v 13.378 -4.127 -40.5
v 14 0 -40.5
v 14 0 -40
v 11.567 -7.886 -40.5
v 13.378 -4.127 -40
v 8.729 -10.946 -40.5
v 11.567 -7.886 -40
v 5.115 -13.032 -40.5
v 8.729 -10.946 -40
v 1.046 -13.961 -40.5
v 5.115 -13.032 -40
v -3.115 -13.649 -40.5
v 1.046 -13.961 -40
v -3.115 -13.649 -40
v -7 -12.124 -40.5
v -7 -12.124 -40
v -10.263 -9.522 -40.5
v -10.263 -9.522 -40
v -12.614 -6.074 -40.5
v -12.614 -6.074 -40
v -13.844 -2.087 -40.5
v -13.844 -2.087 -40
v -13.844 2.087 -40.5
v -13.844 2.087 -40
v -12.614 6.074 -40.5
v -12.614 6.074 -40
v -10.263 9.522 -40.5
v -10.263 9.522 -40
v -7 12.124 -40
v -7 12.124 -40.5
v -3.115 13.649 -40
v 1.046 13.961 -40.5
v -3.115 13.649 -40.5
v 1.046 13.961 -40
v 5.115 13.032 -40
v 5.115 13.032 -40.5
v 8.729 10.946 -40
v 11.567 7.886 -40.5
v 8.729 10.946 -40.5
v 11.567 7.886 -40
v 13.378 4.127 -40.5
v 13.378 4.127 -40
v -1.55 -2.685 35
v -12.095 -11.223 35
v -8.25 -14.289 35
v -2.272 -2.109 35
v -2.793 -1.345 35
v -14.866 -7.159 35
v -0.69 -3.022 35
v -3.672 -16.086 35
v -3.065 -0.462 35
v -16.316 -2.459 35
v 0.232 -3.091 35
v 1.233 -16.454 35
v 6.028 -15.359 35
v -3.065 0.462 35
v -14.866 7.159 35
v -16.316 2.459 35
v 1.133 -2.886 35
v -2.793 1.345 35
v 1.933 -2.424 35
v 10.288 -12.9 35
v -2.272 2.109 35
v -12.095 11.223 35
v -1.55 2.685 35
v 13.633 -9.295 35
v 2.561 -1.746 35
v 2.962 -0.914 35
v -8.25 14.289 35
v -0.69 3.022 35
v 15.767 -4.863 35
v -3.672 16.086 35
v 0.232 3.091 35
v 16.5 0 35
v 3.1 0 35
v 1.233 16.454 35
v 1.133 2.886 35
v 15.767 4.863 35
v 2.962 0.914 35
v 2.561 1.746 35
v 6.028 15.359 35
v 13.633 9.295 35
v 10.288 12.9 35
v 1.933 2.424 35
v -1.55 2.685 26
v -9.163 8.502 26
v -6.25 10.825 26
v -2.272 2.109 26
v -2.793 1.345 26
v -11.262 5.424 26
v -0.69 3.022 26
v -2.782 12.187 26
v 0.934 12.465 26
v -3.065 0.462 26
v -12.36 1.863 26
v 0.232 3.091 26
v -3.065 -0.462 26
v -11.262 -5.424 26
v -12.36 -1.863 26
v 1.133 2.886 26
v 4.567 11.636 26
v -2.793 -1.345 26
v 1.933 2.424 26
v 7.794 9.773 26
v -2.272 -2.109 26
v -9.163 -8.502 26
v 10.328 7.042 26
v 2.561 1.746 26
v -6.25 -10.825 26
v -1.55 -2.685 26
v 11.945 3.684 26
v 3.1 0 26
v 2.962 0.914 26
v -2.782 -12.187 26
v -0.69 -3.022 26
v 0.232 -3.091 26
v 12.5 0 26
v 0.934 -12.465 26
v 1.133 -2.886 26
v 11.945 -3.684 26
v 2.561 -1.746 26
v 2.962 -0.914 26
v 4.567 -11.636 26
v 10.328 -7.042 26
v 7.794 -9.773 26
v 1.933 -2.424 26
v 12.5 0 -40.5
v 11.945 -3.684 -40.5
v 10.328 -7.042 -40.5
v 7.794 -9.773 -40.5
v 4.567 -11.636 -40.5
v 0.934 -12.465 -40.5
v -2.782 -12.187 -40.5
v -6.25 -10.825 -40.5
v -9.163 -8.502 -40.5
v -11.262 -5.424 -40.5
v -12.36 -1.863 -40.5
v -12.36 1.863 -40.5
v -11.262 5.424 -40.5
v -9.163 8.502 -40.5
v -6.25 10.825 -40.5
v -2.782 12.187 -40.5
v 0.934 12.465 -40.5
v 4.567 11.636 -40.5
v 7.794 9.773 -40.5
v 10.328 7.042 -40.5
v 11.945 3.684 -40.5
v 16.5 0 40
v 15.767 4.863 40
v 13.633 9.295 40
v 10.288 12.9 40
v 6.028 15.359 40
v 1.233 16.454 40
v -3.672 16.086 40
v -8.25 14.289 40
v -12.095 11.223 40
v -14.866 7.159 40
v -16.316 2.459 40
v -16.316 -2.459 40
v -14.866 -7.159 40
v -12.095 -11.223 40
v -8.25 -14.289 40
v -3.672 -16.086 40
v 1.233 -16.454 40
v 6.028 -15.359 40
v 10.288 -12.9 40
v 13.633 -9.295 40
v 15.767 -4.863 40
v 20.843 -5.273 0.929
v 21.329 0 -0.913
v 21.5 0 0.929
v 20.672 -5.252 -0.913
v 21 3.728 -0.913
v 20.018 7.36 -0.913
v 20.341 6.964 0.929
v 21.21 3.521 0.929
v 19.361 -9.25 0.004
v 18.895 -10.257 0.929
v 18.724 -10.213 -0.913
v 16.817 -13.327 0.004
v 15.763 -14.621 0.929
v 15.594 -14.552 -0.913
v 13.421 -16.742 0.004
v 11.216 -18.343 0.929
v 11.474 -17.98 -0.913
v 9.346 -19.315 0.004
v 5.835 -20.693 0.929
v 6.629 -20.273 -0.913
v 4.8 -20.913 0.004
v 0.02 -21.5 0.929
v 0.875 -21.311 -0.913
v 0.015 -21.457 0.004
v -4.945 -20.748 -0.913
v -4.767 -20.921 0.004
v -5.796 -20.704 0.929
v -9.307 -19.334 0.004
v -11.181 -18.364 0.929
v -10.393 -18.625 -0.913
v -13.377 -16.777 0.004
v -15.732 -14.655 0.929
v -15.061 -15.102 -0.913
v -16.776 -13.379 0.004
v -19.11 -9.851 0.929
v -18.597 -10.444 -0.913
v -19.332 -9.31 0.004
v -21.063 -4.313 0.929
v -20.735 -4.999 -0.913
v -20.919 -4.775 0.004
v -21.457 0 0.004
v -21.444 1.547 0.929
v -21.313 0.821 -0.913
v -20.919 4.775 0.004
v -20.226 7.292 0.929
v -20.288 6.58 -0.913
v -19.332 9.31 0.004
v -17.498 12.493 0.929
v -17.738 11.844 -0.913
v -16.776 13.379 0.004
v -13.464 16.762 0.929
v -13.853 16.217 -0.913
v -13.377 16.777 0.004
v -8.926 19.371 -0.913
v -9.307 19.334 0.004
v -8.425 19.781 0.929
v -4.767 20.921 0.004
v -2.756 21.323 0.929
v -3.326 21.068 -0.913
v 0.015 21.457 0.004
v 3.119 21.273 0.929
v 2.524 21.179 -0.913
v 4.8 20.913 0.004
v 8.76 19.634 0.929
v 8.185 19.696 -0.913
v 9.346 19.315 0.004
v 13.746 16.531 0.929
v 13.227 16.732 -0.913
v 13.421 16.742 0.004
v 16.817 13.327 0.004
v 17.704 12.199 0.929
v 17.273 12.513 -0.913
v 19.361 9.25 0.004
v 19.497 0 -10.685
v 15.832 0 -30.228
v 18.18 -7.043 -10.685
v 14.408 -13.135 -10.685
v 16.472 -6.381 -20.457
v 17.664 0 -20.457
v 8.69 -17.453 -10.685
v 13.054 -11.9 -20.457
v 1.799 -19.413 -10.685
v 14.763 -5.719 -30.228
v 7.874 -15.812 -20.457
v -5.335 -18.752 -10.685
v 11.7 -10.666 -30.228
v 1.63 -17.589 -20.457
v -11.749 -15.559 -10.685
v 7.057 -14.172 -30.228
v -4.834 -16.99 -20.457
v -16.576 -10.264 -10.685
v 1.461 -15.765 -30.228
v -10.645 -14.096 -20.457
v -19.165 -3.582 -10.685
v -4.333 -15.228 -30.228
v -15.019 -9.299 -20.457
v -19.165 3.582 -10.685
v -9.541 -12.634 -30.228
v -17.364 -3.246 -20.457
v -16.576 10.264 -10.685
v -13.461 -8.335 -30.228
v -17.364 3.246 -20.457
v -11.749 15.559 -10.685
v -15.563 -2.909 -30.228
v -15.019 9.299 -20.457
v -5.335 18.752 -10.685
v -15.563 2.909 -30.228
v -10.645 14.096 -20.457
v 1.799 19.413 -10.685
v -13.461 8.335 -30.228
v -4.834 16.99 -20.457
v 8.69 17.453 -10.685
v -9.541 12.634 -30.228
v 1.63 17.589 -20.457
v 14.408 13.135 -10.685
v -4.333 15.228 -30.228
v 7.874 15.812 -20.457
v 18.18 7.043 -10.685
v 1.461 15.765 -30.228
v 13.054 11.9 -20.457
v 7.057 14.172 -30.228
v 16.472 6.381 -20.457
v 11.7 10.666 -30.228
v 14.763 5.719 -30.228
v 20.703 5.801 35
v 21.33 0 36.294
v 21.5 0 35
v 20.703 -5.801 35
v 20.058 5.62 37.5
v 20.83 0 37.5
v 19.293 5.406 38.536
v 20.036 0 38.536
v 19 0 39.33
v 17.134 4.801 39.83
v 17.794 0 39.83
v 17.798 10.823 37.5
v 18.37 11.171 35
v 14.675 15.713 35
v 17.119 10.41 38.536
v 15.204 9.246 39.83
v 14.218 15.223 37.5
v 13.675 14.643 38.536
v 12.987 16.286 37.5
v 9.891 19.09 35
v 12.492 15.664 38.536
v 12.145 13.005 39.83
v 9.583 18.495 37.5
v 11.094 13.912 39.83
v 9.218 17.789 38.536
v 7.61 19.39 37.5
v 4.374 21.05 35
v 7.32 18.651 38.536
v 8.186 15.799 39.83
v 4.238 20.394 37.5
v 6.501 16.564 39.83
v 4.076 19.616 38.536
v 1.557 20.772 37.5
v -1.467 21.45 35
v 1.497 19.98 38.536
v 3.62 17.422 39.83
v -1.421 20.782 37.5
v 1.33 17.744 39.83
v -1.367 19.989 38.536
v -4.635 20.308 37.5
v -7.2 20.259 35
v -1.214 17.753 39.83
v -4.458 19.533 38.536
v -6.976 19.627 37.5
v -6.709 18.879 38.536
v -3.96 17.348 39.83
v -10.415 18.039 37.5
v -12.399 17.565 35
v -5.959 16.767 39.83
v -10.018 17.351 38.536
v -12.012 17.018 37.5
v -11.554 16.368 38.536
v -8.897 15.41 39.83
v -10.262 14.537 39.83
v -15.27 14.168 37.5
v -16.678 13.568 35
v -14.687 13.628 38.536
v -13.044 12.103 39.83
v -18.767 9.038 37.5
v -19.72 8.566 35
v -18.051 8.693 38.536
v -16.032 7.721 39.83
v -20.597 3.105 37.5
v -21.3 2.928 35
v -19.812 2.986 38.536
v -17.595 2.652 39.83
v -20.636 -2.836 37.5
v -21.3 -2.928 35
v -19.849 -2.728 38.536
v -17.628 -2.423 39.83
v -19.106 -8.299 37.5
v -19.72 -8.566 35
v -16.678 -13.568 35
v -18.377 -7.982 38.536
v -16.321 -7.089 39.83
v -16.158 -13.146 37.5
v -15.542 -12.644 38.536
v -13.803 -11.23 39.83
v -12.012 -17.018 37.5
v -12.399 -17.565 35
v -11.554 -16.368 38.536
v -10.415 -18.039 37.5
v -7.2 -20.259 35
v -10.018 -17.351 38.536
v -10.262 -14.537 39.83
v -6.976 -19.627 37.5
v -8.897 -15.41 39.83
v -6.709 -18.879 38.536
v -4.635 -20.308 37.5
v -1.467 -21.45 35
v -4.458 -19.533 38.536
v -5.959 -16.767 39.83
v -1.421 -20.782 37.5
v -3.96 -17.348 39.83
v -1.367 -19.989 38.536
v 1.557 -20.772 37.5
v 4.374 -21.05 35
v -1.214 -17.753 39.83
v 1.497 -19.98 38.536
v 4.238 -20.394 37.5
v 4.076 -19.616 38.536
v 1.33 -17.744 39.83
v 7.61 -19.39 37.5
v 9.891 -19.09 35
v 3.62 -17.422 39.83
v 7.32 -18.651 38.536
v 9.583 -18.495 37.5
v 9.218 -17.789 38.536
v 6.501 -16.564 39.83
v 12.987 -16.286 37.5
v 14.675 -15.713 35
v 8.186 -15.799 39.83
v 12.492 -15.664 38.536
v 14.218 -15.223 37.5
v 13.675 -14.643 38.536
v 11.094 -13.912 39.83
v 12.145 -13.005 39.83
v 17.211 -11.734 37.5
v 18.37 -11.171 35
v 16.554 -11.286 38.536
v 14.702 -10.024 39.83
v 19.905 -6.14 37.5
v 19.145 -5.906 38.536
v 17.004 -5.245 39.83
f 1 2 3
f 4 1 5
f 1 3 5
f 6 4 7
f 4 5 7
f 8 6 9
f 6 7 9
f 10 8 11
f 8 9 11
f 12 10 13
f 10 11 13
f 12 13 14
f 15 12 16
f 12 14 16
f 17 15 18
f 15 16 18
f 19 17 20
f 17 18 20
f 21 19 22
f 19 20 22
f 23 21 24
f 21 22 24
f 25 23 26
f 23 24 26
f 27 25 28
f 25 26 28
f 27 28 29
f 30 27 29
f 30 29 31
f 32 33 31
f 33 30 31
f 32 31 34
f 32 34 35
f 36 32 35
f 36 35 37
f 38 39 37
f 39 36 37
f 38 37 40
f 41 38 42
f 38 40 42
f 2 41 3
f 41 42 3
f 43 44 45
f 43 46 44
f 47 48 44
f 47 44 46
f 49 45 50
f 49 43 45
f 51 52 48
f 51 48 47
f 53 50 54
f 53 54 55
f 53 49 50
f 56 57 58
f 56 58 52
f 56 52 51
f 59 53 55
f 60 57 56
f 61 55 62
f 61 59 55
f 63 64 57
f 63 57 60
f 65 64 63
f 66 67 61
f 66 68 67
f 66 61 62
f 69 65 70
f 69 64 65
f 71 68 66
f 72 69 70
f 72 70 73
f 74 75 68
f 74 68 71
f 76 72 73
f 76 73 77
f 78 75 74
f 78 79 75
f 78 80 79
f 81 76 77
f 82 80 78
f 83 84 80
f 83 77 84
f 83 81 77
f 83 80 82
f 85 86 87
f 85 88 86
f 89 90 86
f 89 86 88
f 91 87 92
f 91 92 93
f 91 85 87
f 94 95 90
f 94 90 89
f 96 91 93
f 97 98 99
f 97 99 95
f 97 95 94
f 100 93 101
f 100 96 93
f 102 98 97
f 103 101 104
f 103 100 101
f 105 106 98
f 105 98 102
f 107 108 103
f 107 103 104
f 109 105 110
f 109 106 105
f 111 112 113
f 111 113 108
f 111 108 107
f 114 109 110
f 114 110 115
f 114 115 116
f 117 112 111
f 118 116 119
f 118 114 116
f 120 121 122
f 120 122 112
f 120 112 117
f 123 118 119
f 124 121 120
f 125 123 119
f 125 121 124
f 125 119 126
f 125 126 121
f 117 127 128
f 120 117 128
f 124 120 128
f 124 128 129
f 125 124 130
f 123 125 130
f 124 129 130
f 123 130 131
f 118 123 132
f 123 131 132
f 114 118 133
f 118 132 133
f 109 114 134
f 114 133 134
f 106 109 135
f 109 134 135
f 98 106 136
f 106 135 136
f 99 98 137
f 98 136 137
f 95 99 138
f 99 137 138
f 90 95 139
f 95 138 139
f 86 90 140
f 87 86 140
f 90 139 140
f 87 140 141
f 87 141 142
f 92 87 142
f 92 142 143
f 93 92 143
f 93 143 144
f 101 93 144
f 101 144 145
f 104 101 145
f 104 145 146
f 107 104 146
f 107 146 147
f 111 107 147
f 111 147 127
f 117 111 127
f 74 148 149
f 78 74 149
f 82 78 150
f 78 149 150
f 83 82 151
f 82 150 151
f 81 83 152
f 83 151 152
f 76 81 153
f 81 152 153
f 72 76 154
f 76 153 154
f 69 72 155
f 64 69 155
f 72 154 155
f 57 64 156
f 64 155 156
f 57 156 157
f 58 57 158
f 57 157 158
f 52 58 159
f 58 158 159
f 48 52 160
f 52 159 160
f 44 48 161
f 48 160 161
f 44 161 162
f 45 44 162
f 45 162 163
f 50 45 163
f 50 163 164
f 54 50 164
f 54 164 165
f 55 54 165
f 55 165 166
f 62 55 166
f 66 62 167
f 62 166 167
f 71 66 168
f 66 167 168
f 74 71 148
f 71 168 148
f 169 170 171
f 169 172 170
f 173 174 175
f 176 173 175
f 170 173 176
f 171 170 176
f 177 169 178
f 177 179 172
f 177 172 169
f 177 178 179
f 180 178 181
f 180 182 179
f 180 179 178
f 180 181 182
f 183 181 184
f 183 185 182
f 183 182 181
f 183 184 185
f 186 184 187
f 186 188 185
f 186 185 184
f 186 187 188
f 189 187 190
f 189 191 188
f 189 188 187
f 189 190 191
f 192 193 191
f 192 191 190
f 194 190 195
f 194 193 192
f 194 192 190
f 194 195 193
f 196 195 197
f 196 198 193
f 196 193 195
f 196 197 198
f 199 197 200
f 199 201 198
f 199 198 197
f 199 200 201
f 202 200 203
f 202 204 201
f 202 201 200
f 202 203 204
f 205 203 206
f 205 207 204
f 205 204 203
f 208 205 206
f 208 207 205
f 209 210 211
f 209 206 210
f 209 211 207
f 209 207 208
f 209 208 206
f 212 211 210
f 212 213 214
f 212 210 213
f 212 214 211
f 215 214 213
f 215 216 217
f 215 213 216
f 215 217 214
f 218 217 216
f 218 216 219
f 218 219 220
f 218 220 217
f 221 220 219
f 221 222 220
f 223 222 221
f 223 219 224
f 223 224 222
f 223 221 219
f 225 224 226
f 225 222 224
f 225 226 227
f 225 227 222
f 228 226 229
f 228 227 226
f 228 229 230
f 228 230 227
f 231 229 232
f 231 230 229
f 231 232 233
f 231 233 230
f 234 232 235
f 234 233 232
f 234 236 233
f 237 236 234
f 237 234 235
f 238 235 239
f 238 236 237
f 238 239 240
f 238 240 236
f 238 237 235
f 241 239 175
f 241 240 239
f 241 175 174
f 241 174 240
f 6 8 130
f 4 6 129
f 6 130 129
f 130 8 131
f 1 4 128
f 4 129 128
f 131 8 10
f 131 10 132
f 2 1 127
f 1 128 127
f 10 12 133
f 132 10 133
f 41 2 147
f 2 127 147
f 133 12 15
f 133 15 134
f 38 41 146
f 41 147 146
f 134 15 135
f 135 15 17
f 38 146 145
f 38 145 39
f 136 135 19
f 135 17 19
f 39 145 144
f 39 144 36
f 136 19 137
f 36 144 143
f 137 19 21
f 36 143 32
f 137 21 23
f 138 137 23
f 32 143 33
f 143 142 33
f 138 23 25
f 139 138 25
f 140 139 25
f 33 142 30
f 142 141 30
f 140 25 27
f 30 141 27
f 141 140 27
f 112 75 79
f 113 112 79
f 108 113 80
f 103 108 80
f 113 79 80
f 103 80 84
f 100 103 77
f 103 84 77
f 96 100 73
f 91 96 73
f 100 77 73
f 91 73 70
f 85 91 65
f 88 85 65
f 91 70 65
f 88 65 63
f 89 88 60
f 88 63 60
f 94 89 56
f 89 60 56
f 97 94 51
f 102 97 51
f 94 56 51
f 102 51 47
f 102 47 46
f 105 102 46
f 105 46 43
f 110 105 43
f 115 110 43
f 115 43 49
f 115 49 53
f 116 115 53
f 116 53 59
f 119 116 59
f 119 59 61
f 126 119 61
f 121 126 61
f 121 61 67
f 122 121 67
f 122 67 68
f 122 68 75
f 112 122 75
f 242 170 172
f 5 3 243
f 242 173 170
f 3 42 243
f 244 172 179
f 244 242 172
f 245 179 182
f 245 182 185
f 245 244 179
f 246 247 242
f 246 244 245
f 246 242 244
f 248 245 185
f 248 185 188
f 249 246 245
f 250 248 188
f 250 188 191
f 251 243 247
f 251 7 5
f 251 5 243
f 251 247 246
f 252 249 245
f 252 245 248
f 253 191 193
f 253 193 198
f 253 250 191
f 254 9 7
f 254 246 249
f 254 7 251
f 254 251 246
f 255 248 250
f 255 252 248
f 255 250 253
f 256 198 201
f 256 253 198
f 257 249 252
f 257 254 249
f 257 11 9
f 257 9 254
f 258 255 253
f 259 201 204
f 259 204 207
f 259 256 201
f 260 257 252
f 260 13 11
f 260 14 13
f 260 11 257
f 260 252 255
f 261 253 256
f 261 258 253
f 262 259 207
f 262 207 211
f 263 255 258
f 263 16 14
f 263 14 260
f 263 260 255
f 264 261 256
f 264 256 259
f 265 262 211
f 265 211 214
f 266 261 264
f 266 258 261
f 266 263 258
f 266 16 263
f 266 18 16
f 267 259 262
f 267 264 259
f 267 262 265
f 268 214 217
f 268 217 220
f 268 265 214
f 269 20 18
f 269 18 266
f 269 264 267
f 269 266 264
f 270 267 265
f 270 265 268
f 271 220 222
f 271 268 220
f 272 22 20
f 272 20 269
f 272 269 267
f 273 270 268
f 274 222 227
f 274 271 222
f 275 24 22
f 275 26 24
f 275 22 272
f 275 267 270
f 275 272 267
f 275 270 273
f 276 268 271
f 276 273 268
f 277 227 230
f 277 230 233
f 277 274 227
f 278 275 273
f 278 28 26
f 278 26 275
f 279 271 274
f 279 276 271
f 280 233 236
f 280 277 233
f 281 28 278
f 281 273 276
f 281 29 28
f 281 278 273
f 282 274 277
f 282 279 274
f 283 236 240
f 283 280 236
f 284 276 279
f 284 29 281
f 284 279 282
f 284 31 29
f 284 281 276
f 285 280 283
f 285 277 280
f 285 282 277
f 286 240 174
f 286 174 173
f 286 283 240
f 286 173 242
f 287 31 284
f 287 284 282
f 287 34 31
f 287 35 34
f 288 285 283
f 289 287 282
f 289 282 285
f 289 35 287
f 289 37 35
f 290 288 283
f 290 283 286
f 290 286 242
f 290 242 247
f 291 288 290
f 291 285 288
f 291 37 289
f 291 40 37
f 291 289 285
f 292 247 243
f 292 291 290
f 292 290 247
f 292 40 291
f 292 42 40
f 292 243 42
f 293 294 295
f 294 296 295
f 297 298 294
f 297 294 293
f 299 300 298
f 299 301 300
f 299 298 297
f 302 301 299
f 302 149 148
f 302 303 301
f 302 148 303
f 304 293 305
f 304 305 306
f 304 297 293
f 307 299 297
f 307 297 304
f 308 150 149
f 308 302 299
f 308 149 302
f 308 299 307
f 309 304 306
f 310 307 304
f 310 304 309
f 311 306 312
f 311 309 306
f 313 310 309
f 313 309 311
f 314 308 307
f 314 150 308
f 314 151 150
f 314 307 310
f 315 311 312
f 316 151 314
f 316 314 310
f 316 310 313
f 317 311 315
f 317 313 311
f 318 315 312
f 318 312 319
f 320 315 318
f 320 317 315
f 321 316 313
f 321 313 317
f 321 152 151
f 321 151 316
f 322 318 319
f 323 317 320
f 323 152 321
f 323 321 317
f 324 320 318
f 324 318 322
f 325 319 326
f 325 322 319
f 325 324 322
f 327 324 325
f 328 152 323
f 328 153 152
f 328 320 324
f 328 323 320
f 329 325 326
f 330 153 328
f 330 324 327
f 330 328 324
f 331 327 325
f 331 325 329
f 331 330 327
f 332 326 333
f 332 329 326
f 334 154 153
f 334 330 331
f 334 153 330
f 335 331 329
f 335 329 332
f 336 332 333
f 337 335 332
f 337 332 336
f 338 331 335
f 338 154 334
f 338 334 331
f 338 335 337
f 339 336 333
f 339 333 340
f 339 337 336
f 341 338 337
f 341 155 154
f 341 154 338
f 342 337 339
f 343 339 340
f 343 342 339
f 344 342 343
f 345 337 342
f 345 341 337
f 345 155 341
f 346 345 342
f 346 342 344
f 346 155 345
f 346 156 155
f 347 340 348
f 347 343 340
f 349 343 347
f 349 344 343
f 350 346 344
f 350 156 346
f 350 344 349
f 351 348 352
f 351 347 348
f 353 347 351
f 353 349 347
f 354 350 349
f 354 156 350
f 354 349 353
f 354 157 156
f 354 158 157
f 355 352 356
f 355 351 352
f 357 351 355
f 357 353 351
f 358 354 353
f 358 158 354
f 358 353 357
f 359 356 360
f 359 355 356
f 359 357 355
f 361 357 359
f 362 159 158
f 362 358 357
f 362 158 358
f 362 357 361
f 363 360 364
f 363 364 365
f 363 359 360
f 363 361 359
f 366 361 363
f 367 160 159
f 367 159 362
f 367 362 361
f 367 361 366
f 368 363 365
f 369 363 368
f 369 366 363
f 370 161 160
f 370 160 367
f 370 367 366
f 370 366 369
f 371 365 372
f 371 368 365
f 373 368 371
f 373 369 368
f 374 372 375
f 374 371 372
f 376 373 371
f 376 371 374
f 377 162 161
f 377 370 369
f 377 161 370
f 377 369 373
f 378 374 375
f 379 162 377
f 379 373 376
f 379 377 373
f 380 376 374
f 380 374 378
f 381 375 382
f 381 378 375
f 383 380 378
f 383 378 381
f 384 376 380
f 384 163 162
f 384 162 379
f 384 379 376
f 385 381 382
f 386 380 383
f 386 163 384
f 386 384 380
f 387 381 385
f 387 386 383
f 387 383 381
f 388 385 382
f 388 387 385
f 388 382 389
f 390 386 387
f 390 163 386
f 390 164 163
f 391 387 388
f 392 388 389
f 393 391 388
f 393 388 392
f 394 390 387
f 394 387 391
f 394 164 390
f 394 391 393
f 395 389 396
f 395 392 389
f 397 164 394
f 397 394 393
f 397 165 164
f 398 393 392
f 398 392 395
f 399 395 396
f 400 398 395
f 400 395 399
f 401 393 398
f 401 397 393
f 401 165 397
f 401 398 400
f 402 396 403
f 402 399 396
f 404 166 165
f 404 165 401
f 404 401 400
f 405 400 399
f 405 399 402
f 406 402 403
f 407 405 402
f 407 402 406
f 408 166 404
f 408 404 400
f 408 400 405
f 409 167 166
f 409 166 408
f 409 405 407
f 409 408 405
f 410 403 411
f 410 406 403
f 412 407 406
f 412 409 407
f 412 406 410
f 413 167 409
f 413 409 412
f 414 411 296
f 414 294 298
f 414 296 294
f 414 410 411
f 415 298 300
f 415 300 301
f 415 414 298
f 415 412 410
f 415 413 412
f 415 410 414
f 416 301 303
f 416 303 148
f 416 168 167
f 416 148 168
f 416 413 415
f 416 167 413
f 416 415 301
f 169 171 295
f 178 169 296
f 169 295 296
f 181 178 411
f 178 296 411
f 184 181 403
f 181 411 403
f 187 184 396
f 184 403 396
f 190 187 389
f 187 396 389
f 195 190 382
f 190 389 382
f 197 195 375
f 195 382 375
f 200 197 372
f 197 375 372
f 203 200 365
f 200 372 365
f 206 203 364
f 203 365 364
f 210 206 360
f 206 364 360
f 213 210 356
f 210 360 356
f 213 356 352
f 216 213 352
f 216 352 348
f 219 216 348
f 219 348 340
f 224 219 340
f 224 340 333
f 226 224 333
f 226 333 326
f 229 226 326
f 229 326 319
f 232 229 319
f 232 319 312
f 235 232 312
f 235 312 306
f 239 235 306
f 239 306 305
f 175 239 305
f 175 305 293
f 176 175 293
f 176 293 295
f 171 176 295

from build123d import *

# Parameters (mm, degrees)
F0_R      = 21.5
F1_DEPTH  = 40
F2_R      = 5
F3_R      = 21.5
F4_DEPTH  = 40
F5_SIZE2  = 7.5
F5_SIZE   = 40
F6_DEPTH  = 10
F7_R      = 10
F10_R     = 4.9
F11_DEPTH = 75
F12_R     = 16.5
F13_DEPTH = 5
F14_R     = 3.1
F15_DEPTH = 85.001
F16_R     = 12.5
F17_DEPTH = 76


with BuildPart() as f1:
    # F0 (on Top) → F1 (new body)
    with BuildSketch(Plane.XY):
        Circle(F0_R)
    extrude(amount=F1_DEPTH)

    # F2
    f2_edges = [f1.edges().sort_by_distance(p)[0] for p in [
        (-21.5, 0, 40),
    ]]
    fillet(f2_edges, radius=F2_R)

    # F3 (on face) → F4 (join)
    with BuildSketch(Plane(origin=(0, 0, 0), x_dir=(1, 0, 0), z_dir=(0, 0, -1))):
        Circle(F3_R)
    extrude(amount=F4_DEPTH)

    # F5
    f5_edges = [f1.edges().sort_by_distance(p)[0] for p in [
        (-21.5, 0, -40),
    ]]
    chamfer(f5_edges, length=F5_SIZE, length2=F5_SIZE2)

    # F6 (add): a face of the model
    f6_faces = [f1.faces().sort_by_distance(p)[0] for p in [
        (0, 0, -40),
    ]]
    extrude(f6_faces, amount=F6_DEPTH)

    # F7
    f7_edges = [f1.edges().sort_by_distance(p)[0] for p in [
        (-21.5, 0, 0),
    ]]
    fillet(f7_edges, radius=F7_R)

    # F8 (on Right) → F9 (revolve, cut)
    with BuildSketch(Plane.YZ):
        Polygon((-7.5, -40.5), (-17.4298945979, -40.5), (-17.4298945979, -47.5), (-17.4298945979, -53.659953177), (-10, -53.659953177), (-10, -47.5), (-7.5, -47.5), align=None)
    revolve(axis=Axis((0, 0, -53.4000843763), (0, 0, -1)), mode=Mode.SUBTRACT)

    # F10 (on face) → F11 (cut)
    with BuildSketch(Plane(origin=(0, 0, -50), x_dir=(1, 0, 0), z_dir=(0, 0, -1))):
        Circle(F10_R)
    extrude(amount=-F11_DEPTH, mode=Mode.SUBTRACT)

    # F12 (on face) → F13 (cut)
    with BuildSketch(Plane.XY.offset(40)):
        Circle(F12_R)
    extrude(amount=-F13_DEPTH, mode=Mode.SUBTRACT)

    # F14 (on face) → F15 (cut, through all)
    with BuildSketch(Plane.XY.offset(35)):
        Circle(F14_R)
    extrude(amount=-F15_DEPTH, mode=Mode.SUBTRACT)

    # F16 (on face) → F17 (cut)
    with BuildSketch(Plane(origin=(0, 0, -50), x_dir=(1, 0, 0), z_dir=(0, 0, -1))):
        Circle(F16_R)
    extrude(amount=-F17_DEPTH, mode=Mode.SUBTRACT)


solid = f1.part
